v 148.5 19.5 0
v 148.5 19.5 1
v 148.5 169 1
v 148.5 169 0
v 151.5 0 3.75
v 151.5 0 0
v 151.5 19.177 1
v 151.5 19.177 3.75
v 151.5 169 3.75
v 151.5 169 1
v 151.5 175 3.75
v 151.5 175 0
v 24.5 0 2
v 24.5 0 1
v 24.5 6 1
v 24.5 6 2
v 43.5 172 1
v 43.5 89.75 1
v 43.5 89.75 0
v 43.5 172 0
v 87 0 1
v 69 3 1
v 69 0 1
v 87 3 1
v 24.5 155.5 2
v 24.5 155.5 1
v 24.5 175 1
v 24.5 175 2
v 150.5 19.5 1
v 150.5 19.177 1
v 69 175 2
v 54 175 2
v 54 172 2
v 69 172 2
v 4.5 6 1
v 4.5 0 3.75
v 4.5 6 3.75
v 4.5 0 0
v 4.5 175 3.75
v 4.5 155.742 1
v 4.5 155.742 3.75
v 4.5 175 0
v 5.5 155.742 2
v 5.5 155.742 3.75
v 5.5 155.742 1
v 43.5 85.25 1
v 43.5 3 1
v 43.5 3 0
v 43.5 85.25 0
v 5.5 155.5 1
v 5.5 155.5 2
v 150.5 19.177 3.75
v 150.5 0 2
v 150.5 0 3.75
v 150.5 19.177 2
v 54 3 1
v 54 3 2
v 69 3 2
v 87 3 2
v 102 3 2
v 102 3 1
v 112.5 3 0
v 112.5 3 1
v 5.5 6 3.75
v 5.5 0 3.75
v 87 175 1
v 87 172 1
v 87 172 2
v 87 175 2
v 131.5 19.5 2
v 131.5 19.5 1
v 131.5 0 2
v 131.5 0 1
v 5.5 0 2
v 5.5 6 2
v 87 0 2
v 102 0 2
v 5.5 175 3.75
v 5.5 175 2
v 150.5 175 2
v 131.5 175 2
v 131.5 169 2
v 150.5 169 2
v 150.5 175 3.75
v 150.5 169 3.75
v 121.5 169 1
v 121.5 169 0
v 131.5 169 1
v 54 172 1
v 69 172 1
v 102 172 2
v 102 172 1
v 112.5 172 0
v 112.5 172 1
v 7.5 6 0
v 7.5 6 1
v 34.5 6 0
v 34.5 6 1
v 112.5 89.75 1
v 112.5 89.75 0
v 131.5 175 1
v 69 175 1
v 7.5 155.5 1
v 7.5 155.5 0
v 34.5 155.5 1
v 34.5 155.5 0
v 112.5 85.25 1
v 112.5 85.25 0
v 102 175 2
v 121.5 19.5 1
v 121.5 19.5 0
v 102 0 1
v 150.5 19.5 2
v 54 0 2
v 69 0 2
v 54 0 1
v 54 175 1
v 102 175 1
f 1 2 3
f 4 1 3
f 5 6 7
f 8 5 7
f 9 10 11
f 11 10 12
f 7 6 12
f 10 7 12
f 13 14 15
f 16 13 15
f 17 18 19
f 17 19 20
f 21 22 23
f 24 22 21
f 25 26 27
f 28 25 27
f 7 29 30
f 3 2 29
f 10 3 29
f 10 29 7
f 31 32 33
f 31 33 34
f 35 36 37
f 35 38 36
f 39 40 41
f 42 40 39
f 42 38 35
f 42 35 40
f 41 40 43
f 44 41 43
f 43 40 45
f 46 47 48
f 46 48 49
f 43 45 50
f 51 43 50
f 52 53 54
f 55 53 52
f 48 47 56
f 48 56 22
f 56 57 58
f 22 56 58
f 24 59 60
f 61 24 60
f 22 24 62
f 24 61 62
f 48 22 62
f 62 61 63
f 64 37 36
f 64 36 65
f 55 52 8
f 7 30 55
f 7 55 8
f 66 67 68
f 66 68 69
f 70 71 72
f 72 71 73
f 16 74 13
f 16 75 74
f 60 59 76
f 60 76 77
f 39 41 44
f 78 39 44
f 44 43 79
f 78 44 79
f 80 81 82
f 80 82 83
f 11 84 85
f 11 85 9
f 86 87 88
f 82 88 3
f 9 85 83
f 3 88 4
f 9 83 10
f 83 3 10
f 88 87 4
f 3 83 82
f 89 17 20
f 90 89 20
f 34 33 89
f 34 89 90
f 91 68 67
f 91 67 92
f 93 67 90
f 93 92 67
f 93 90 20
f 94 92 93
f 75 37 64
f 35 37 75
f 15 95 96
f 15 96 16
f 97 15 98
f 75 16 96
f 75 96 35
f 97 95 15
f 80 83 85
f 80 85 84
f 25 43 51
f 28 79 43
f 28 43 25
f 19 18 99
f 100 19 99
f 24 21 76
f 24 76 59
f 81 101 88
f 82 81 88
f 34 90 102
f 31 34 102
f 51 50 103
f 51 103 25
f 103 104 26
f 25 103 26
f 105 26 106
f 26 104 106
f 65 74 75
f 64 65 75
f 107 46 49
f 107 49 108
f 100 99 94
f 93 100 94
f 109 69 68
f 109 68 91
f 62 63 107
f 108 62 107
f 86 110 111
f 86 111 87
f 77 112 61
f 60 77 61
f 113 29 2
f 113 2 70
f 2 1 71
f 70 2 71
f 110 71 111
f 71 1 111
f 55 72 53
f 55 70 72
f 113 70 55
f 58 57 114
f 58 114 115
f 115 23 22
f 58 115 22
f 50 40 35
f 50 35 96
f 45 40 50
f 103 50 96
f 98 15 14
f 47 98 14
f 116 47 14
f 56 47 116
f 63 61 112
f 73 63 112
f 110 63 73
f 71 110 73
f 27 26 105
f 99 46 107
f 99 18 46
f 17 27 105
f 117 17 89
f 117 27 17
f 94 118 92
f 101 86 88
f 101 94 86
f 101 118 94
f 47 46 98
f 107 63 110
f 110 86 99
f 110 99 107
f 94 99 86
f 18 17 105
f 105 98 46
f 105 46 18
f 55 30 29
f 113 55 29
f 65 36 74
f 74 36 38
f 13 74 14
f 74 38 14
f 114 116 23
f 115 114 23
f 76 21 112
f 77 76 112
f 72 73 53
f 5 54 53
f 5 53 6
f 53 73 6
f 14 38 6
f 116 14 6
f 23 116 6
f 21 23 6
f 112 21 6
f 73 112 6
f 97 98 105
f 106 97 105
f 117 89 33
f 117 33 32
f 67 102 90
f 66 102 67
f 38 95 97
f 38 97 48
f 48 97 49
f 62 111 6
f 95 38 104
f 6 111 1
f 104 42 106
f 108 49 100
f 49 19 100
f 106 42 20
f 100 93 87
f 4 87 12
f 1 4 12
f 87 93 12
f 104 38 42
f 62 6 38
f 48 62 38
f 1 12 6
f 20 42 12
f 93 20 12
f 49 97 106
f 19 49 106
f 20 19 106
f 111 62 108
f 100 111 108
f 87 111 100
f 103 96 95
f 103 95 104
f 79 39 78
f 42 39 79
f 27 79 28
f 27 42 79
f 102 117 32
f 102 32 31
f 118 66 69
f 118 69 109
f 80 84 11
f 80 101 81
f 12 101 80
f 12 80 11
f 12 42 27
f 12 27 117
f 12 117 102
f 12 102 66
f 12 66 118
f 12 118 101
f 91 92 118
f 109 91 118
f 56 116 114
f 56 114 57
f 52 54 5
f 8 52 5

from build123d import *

# Parameters (mm, degrees)
F0_W      = 156
F0_H      = 175
F1_DEPTH  = 1
F2_W      = 4.5
F2_H      = 175
F2_W_2    = 27
F2_H_2    = 149.5
F2_W_3    = 69
F2_H_3    = 82.25
F3_DEPTH  = 1.001
F4_W      = 15
F4_H      = 3
F5_DEPTH  = 1
F6_W      = 1
F6_H      = 19.1769432276
F6_H_2    = 19.2576229572
F7_DEPTH  = 2.75
F9_DEPTH  = 1
F10_W     = 1
F10_H     = 6
F11_DEPTH = 2.75
F12_W     = 1
F12_H     = 6
F13_DEPTH = 2.75


with BuildPart() as f1:
    # F0 (on Top) → F1 (new body)
    with BuildSketch(Plane.XY):
        with Locations((78, 87.5)):
            Rectangle(F0_W, F0_H)
    extrude(amount=F1_DEPTH)

    # F2 (on face) → F3 (cut, through all)
    with BuildSketch(Plane.XY.offset(1)):
        with Locations((2.25, 87.5)):
            Rectangle(F2_W, F2_H)
        with Locations((21, 80.75)):
            Rectangle(F2_W_2, F2_H_2)
        with Locations((78, 130.875)):
            Rectangle(F2_W_3, F2_H_3)
        with Locations((78, 44.125)):
            Rectangle(F2_W_3, F2_H_3)
        with Locations((135, 94.25)):
            Rectangle(F2_W_2, F2_H_2)
        with Locations((153.75, 87.5)):
            Rectangle(F2_W, F2_H)
    extrude(amount=-F3_DEPTH, mode=Mode.SUBTRACT)

    # F4 (on face) → F5 (join)
    with BuildSketch(Plane.XY.offset(1)):
        Polygon((24.5, 155.5), (24.5, 175), (5.5, 175), (5.5, 155.5), (7.5, 155.5), align=None)
        with Locations((61.5, 173.5)):
            Rectangle(F4_W, F4_H)
        with Locations((94.5, 173.5)):
            Rectangle(F4_W, F4_H)
        Polygon((131.5, 0), (150.5, 0), (150.5, 19.5), (148.5, 19.5), (131.5, 19.5), align=None)
        with Locations((94.5, 1.5)):
            Rectangle(F4_W, F4_H)
        with Locations((61.5, 1.5)):
            Rectangle(F4_W, F4_H)
    extrude(amount=F5_DEPTH)

    # F6 (on face) → F7 (join)
    with BuildSketch(Plane.XY.offset(1)):
        with Locations((151, 9.5884716138)):
            Rectangle(F6_W, F6_H)
        with Locations((5, 165.3711885214)):
            Rectangle(F6_W, F6_H_2)
    extrude(amount=F7_DEPTH)

    # F8 (on face) → F9 (join)
    with BuildSketch(Plane.XY.offset(1)):
        Polygon((5.5, 0), (24.5, 0), (24.5, 6), (7.5, 6), (5.5, 6), align=None)
        Polygon((131.5, 175), (131.5, 169), (148.5, 169), (150.5, 169), (150.5, 175), align=None)
    extrude(amount=F9_DEPTH)

    # F10 (on face) → F11 (join)
    with BuildSketch(Plane.XY.offset(1)):
        with Locations((151, 172)):
            Rectangle(F10_W, F10_H)
    extrude(amount=F11_DEPTH)

    # F12 (on face) → F13 (join)
    with BuildSketch(Plane.XY.offset(1)):
        with Locations((5, 3)):
            Rectangle(F12_W, F12_H)
    extrude(amount=F13_DEPTH)


solid = f1.part
